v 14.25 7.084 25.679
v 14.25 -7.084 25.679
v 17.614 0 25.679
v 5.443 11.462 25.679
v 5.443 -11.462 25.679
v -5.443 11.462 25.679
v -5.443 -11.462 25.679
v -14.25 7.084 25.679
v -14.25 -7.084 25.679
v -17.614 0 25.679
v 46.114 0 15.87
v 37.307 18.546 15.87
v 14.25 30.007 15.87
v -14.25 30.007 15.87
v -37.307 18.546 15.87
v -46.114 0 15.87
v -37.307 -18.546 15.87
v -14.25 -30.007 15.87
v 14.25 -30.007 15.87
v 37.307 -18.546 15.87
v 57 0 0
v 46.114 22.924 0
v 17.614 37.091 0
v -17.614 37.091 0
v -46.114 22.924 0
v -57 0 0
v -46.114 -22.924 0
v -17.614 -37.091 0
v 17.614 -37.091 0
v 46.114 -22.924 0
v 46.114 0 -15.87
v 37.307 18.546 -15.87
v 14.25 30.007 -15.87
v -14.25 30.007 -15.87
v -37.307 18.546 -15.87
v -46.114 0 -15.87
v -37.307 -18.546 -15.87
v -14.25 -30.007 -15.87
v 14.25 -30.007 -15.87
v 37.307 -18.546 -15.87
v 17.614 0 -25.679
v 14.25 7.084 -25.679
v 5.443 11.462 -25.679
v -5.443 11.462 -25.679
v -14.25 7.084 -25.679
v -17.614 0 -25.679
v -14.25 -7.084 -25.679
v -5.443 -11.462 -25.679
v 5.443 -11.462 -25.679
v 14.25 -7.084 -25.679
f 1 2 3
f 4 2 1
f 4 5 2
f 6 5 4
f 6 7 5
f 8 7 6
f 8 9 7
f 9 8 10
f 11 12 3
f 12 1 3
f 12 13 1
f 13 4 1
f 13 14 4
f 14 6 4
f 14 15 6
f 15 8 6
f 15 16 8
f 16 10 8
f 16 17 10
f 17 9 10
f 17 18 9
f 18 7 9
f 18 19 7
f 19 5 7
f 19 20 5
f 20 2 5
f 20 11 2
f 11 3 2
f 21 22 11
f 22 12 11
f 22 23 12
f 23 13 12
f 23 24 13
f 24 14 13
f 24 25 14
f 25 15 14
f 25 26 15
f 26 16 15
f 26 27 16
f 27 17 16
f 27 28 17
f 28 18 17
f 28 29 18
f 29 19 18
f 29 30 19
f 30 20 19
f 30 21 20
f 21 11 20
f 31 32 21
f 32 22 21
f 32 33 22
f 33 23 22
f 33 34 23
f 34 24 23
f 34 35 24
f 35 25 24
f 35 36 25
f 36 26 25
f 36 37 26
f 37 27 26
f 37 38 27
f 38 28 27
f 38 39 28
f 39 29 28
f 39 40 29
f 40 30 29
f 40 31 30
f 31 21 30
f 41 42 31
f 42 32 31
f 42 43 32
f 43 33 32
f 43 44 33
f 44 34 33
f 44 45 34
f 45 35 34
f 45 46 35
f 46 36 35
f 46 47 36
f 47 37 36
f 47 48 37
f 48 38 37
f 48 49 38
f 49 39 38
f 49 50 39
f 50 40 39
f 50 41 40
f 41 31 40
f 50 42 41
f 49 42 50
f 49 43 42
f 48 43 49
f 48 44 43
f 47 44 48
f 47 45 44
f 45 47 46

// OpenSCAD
// Generated by SolidPython 1.0.1 on 2020-07-29 00:46:54


scale(v = [19, 13, 9]) {
	sphere(r = 3);
}
/***********************************************
*********      SolidPython code:      **********
************************************************
 
# import packages: SolidPython
from solid import *
from solid.utils import *
from itertools import chain, combinations, permutations


class Resize:

    def __init__(self, scad_file):
        self.scad_file = scad_file
        #self.scad_file = import_scad(scad_file)
        # cone/cylinder param:
        self.r1 = 0
        self.r2 = 0
        self.h = 0
        # rectangular prism param:
        self.w = 0
        self.l = 0
        # ellipse param:
        self.r = 0

    # import OpenScad code (file name corresponds to shape)


    # classify shape + parameters
    def assign(self, param1, param2, param3):
        if self.scad_file == 'cone.scad':
            self.r1 = param1
            self.r2 = param2
            self.h = param3
        elif self.scad_file == 'cylinder.scad':
            self.r1 = param1
            self.r2 = param2
            self.h = param3
        elif self.scad_file == 'rectangularPrism.scad':
            self.h = param1
            self.l = param2
            self.w = param3
        else:
            self.r = param1
            self.h = param2

    # resize parameters
    def iterate(self):
        x = range(3, 20, 2)
        i = 1
        if self.scad_file == 'cone.scad':
            tempList = list(permutations(x, 2))
            for temp in tempList:
                param1 = temp[0]
                param2 = temp[1]
                filepath = 'produced_scad_files/' + 'cone' + str(param1) + '_' + str(param2) + '_' + '.scad'
                scad_render_to_file(cylinder(h=param1, r1=param2, r2=0), filepath)

        elif self.scad_file == 'cylinder.scad':
            tempList = list(permutations(x, 3))
            for temp in tempList:
                param1 = temp[0]
                param2 = temp[1]
                filepath = 'produced_scad_files/' + 'cylinder' + str(param1) + '_' + str(param2) + '_' + '.scad'
                scad_render_to_file(cylinder(h=param1, r1=param2, r2=param2), filepath)

        elif self.scad_file == 'rectangularPrism.scad':
            tempList = list(permutations(x, 3))
            for temp in tempList:
                param1 = temp[0]
                param2 = temp[1]
                param3 = temp[2]
                filepath = 'produced_scad_files/' + 'rectangularPrism' + str(param1) + '_' + str(param2) + '_' + str(
                    param3) + '.scad'
                scad_render_to_file(cube(size=(param1, param2, param3)), filepath)

        elif self.scad_file == 'ellipse.scad':
            tempList = list(permutations(x, 4))
            for temp in tempList:
                param1 = temp[0]
                param2 = temp[1]
                param3 = temp[2]
                param4 = temp[3]
                filepath = 'produced_scad_files/' + 'ellipse' + str(param1) + '_' + str(param2) + '_' + str(param3) + '_' + str(param4) + '.scad'
                scad_render_to_file(scale([param1, param2, param3])(sphere(r=param4)), filepath)

    def render_to_scadfile(self):
        scad_render_to_file(scad, 'example.scad') 
 
************************************************/
